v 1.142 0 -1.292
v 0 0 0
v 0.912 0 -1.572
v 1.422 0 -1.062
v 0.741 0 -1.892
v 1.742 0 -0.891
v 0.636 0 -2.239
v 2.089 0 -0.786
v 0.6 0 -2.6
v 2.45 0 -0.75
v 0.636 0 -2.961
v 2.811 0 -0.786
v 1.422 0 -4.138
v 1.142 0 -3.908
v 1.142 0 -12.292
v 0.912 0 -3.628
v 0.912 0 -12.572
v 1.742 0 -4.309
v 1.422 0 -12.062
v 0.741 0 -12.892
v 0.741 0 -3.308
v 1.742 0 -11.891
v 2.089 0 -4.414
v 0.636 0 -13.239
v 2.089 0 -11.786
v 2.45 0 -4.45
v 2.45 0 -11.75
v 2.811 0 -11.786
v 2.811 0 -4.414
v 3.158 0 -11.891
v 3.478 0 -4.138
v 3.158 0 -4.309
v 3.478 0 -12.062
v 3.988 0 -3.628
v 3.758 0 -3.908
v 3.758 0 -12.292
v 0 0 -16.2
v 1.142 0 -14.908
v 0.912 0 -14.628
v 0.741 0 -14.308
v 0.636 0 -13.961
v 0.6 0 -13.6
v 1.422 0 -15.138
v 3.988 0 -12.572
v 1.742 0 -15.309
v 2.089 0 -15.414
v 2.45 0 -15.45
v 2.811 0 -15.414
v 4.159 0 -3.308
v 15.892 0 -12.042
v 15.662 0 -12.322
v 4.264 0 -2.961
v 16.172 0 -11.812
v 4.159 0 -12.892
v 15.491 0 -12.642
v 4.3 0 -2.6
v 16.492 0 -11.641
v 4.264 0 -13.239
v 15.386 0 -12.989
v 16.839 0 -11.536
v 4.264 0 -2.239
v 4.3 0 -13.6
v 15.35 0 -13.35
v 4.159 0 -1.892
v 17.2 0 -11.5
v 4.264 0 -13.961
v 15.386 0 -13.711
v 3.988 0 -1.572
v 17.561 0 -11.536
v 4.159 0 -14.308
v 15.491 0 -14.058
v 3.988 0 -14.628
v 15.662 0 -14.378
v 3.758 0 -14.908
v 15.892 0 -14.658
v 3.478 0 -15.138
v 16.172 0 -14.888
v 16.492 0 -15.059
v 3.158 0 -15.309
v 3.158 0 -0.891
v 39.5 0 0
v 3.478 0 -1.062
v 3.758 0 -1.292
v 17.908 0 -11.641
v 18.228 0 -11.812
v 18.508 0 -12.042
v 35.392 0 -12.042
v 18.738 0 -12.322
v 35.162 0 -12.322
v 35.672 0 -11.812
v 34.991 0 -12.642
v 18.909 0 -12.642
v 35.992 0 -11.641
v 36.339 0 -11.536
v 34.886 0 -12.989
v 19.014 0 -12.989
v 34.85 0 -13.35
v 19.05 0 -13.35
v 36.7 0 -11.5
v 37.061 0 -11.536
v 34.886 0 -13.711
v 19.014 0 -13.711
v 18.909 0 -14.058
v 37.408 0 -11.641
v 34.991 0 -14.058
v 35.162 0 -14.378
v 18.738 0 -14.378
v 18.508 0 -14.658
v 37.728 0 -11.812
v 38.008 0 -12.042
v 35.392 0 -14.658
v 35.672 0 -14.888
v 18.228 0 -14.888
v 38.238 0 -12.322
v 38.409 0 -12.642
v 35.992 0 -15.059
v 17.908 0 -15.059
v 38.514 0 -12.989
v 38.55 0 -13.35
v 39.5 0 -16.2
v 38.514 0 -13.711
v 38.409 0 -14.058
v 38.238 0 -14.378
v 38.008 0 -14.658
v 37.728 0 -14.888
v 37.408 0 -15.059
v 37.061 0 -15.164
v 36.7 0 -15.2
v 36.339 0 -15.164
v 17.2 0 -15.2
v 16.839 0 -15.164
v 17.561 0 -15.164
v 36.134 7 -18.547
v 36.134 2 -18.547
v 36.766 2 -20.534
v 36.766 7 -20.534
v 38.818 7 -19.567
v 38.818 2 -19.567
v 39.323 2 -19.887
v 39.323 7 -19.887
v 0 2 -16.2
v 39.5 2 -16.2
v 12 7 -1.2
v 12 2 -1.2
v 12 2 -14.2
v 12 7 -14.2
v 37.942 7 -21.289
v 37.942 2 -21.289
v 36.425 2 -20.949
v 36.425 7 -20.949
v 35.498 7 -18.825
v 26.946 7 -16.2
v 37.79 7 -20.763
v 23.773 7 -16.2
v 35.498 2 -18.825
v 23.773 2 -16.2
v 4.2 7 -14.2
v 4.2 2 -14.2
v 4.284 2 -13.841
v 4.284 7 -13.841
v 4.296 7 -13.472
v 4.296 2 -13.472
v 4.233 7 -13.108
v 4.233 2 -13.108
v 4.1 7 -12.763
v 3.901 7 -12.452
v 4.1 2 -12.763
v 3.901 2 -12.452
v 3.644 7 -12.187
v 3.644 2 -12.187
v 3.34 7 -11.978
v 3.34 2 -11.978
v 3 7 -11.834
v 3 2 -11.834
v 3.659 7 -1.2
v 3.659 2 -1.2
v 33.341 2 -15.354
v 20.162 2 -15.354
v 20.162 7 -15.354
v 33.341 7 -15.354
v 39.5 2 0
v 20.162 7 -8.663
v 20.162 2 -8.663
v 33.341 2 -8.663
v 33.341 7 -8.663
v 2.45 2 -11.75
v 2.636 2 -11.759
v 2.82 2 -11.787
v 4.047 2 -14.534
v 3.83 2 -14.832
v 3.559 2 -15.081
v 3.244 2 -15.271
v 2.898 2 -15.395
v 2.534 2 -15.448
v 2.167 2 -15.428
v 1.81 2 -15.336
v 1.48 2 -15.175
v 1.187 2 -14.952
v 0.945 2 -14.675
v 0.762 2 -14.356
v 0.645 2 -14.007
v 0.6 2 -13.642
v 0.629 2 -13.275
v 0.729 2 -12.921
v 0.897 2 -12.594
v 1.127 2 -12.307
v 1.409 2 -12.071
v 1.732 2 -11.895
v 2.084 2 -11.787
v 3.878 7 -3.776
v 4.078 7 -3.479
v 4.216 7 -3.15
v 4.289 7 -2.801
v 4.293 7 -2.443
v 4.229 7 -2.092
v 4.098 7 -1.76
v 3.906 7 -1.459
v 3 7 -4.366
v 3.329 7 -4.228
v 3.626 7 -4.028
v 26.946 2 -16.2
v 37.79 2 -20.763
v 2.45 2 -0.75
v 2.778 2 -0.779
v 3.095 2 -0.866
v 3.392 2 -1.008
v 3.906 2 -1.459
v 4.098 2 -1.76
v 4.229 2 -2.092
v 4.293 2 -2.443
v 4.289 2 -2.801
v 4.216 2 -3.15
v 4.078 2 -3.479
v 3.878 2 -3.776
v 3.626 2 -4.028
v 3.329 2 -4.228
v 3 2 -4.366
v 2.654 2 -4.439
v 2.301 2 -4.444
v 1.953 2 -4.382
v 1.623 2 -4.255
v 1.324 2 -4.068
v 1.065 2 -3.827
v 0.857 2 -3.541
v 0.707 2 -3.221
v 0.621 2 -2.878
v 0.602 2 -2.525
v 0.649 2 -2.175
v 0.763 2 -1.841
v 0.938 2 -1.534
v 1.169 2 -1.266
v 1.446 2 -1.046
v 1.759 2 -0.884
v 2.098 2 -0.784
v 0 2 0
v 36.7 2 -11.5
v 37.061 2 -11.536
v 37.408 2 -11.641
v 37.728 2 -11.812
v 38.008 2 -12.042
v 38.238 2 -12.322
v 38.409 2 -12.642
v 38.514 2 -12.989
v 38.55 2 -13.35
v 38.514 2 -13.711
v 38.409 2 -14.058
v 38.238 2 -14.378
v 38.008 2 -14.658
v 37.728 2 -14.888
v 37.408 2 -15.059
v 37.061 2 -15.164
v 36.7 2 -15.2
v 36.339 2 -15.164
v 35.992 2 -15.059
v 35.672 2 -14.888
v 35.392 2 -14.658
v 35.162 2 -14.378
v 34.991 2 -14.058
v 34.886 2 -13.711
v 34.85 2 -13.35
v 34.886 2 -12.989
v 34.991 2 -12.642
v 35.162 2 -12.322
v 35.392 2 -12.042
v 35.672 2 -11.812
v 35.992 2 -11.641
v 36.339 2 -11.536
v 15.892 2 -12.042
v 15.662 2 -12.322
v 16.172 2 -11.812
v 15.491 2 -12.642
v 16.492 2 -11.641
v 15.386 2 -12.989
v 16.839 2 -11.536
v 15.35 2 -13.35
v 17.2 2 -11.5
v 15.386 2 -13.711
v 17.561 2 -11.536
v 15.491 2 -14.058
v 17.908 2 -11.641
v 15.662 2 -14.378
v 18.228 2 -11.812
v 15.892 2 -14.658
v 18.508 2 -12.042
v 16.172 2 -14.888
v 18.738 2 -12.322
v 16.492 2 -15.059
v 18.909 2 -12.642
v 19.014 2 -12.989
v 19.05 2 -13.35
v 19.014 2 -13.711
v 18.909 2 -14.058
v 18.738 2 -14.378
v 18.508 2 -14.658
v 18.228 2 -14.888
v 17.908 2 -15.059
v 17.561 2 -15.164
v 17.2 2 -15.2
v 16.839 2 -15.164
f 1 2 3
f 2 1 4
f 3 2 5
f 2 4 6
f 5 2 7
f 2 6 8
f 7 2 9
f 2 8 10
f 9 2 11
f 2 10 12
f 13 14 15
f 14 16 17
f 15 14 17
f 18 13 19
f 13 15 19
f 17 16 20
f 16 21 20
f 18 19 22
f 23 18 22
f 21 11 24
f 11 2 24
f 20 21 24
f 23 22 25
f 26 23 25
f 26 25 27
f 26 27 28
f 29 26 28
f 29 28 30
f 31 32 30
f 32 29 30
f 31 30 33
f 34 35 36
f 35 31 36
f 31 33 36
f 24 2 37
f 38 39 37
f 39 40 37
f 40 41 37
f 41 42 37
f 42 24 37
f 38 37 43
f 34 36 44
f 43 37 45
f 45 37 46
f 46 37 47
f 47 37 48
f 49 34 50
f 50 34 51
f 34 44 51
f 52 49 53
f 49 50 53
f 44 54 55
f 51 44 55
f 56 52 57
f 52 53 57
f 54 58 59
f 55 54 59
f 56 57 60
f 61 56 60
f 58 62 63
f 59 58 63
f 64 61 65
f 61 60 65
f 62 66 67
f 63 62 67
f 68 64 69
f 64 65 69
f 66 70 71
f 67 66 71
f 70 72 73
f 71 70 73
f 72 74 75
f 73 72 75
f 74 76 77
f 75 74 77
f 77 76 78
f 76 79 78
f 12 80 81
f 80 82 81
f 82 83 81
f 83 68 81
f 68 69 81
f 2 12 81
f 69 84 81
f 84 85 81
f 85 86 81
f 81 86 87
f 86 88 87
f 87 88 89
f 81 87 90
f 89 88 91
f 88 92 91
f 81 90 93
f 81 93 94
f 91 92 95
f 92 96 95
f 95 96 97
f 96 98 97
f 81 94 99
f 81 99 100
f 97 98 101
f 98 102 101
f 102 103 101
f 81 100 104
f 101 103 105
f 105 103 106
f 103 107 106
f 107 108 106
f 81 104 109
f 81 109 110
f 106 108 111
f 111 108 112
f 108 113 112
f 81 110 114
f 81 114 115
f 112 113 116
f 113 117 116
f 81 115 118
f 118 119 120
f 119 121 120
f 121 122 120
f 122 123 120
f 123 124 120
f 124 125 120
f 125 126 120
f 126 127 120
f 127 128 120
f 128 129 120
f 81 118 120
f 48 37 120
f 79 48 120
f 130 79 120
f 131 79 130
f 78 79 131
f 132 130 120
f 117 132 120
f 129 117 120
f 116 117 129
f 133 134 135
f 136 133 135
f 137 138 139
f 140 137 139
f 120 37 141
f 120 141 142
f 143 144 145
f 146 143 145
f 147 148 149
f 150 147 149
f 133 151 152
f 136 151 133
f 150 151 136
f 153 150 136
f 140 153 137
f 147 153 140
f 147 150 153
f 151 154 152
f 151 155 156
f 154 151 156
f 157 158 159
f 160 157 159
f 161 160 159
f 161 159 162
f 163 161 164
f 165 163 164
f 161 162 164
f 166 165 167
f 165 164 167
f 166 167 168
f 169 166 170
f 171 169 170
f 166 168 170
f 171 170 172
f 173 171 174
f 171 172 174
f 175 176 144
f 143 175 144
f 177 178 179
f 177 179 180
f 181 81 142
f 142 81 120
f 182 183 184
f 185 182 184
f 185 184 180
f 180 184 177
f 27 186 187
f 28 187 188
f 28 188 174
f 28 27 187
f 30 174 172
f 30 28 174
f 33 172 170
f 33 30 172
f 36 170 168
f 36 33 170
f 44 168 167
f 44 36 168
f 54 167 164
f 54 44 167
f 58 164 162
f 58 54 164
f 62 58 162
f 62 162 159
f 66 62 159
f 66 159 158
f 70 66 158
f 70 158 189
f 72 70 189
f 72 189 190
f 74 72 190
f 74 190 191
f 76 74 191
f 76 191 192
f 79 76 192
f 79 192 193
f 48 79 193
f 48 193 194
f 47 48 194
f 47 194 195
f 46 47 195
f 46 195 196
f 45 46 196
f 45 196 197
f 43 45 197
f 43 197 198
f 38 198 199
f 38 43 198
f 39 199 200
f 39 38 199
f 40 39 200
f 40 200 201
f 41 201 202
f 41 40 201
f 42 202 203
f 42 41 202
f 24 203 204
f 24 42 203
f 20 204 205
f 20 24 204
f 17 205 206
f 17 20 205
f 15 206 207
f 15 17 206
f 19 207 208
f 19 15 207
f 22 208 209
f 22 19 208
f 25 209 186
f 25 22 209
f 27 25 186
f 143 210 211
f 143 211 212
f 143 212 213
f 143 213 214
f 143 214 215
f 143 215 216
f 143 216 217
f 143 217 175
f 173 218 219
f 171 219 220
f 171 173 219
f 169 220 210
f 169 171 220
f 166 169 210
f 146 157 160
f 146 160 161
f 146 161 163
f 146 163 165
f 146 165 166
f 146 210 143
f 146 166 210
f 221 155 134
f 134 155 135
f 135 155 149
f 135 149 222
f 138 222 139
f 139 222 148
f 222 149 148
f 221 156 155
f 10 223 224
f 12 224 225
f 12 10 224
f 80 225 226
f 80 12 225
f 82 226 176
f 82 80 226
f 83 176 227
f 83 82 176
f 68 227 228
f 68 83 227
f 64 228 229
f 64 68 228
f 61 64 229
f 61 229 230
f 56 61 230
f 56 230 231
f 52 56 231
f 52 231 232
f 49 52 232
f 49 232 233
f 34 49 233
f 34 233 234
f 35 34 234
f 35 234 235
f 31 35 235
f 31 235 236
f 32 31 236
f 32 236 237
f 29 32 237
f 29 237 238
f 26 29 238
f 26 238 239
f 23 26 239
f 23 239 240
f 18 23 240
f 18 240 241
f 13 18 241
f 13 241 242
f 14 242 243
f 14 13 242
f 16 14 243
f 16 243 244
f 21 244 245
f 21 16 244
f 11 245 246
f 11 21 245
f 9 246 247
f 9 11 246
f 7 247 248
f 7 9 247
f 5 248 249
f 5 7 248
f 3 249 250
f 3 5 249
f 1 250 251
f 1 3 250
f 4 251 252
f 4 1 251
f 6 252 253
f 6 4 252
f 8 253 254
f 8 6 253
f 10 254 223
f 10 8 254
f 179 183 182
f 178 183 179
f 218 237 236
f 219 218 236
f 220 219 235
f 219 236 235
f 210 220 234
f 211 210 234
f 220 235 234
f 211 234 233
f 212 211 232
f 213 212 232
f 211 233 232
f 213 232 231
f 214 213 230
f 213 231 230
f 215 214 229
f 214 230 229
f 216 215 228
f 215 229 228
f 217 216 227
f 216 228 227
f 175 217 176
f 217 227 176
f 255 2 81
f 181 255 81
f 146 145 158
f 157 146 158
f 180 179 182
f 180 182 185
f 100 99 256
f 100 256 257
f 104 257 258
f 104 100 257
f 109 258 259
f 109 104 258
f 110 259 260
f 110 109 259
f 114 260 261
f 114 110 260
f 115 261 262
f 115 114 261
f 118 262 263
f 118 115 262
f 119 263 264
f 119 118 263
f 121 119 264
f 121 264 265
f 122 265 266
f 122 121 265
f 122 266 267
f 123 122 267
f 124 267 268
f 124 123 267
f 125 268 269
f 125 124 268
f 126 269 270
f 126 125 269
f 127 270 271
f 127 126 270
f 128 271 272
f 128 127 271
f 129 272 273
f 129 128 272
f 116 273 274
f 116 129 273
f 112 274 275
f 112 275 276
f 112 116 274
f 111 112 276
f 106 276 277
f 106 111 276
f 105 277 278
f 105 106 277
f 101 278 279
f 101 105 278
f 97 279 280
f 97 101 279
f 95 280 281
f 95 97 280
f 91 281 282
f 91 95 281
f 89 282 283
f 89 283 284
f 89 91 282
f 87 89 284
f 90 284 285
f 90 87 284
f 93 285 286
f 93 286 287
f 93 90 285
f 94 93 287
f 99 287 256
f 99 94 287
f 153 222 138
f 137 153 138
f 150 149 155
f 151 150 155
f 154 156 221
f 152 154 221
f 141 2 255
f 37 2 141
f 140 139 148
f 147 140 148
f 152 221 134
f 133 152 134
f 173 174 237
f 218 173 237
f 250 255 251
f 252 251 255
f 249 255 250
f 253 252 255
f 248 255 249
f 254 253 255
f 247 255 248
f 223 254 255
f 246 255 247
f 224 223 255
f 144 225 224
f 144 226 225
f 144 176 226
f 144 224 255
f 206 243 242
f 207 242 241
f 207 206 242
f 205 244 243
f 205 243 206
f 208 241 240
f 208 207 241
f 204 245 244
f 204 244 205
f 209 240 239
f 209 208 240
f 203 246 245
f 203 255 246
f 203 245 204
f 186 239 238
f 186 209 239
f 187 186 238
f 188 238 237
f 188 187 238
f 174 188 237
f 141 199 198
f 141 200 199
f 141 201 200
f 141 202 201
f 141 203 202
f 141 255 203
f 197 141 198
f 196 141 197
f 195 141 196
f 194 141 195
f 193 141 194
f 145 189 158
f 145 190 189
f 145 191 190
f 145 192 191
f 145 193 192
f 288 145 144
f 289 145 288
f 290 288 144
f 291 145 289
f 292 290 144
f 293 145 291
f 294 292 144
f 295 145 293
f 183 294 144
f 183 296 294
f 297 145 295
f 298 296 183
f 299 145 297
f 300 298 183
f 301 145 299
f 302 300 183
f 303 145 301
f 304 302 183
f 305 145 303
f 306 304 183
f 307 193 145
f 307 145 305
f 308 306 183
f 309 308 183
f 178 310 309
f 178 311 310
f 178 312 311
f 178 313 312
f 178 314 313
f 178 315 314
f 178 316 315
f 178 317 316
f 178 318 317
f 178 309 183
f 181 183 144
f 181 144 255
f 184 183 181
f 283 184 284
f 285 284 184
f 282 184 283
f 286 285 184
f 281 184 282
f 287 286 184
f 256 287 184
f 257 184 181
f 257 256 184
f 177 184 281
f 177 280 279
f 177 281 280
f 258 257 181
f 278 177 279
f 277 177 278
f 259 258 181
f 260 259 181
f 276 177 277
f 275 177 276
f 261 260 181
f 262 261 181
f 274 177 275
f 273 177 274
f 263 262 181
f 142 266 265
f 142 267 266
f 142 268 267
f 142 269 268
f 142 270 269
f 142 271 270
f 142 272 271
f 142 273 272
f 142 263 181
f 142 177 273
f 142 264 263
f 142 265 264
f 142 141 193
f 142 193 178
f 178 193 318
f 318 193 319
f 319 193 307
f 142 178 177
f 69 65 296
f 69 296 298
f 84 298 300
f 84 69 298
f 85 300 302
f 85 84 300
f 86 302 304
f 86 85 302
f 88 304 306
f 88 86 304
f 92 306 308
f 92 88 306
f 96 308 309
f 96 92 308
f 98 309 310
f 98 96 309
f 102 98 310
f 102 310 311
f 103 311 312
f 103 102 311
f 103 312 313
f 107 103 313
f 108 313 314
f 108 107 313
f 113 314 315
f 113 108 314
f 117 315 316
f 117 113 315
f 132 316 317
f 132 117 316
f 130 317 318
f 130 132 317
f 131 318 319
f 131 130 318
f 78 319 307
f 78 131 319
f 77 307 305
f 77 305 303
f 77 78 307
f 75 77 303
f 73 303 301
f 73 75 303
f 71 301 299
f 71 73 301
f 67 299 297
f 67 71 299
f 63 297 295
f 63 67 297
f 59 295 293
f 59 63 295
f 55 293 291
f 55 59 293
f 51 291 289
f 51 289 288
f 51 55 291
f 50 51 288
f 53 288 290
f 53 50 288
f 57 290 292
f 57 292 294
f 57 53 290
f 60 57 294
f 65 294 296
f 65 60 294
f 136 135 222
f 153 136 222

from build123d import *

# Parameters (mm, degrees)
SKETCH1_W           = 39.5
SKETCH1_H           = 16.2
SKETCH1_R           = 1.85
BOSS_EXTRUDE1_DEPTH = 2
SKETCH3_W           = 13.178872399
SKETCH3_H           = 6.690552867
BOSS_EXTRUDE2_DEPTH = 5


with BuildPart() as part:
    # Sketch1 → Boss-Extrude1 (new body)
    with BuildSketch(Plane(origin=(0, 0, 0), x_dir=(1, 0, 0), z_dir=(0, 1, 0))):
        with Locations((19.75, 8.1)):
            Rectangle(SKETCH1_W, SKETCH1_H)
        with Locations(Location((2.45, 2.6, 0), (0, 0, 270))):
            Circle(SKETCH1_R, mode=Mode.SUBTRACT)
        with Locations(Location((2.45, 13.6, 0), (0, 0, 270))):
            Circle(SKETCH1_R, mode=Mode.SUBTRACT)
        with Locations(Location((17.2, 13.35, 0), (0, 0, 270))):
            Circle(SKETCH1_R, mode=Mode.SUBTRACT)
        with Locations(Location((36.7, 13.35, 0), (0, 0, 270))):
            Circle(SKETCH1_R, mode=Mode.SUBTRACT)
    extrude(amount=BOSS_EXTRUDE1_DEPTH)

    # Sketch3 → Boss-Extrude2 (add)
    with BuildSketch(Plane(origin=(0, 2, 0), x_dir=(1, 0, 0), z_dir=(0, 1, 0))):
        Polygon((35.497687692, 18.825256707), (23.773240265, 16.2), (26.946450249, 16.2), (36.134464305, 18.547298661), (36.765687587, 20.534044166), (37.789665501, 20.763326177), (38.817684959, 19.566778939), (39.323268299, 19.886981721), (37.942468273, 21.288579371), (36.424590482, 20.948706735), align=None)
        with Locations((26.751095909, 12.008308005)):
            Rectangle(SKETCH3_W, SKETCH3_H)
        with BuildLine():
            Line((12, 14.2), (4.2, 14.2))
            ThreePointArc((4.2, 14.2), (4.099971409, 12.763283592), (3, 11.833647827))
            Line((3, 11.833647827), (3, 4.366352173))
            ThreePointArc((3, 4.366352173), (4.261150091, 2.977141017), (3.659338662, 1.2))
            Line((3.659338662, 1.2), (12, 1.2))
            Line((12, 1.2), (12, 14.2))
        make_face()
    extrude(amount=BOSS_EXTRUDE2_DEPTH)


with BuildPart() as boss_extrude2_piece_1:
    # of the separate pieces the step leaves, piece 1, a body of its own (boss_extrude2_pieces)
    add(part.part.solids().sort_by_distance((0, 0, 0))[0])


with BuildPart() as boss_extrude2_piece_2:
    # of the separate pieces the step leaves, piece 2, a body of its own (boss_extrude2_pieces)
    add(part.part.solids().sort_by_distance((36.424590482, 2, -20.948706735))[0])


solid = Compound([boss_extrude2_piece_1.part, boss_extrude2_piece_2.part])
